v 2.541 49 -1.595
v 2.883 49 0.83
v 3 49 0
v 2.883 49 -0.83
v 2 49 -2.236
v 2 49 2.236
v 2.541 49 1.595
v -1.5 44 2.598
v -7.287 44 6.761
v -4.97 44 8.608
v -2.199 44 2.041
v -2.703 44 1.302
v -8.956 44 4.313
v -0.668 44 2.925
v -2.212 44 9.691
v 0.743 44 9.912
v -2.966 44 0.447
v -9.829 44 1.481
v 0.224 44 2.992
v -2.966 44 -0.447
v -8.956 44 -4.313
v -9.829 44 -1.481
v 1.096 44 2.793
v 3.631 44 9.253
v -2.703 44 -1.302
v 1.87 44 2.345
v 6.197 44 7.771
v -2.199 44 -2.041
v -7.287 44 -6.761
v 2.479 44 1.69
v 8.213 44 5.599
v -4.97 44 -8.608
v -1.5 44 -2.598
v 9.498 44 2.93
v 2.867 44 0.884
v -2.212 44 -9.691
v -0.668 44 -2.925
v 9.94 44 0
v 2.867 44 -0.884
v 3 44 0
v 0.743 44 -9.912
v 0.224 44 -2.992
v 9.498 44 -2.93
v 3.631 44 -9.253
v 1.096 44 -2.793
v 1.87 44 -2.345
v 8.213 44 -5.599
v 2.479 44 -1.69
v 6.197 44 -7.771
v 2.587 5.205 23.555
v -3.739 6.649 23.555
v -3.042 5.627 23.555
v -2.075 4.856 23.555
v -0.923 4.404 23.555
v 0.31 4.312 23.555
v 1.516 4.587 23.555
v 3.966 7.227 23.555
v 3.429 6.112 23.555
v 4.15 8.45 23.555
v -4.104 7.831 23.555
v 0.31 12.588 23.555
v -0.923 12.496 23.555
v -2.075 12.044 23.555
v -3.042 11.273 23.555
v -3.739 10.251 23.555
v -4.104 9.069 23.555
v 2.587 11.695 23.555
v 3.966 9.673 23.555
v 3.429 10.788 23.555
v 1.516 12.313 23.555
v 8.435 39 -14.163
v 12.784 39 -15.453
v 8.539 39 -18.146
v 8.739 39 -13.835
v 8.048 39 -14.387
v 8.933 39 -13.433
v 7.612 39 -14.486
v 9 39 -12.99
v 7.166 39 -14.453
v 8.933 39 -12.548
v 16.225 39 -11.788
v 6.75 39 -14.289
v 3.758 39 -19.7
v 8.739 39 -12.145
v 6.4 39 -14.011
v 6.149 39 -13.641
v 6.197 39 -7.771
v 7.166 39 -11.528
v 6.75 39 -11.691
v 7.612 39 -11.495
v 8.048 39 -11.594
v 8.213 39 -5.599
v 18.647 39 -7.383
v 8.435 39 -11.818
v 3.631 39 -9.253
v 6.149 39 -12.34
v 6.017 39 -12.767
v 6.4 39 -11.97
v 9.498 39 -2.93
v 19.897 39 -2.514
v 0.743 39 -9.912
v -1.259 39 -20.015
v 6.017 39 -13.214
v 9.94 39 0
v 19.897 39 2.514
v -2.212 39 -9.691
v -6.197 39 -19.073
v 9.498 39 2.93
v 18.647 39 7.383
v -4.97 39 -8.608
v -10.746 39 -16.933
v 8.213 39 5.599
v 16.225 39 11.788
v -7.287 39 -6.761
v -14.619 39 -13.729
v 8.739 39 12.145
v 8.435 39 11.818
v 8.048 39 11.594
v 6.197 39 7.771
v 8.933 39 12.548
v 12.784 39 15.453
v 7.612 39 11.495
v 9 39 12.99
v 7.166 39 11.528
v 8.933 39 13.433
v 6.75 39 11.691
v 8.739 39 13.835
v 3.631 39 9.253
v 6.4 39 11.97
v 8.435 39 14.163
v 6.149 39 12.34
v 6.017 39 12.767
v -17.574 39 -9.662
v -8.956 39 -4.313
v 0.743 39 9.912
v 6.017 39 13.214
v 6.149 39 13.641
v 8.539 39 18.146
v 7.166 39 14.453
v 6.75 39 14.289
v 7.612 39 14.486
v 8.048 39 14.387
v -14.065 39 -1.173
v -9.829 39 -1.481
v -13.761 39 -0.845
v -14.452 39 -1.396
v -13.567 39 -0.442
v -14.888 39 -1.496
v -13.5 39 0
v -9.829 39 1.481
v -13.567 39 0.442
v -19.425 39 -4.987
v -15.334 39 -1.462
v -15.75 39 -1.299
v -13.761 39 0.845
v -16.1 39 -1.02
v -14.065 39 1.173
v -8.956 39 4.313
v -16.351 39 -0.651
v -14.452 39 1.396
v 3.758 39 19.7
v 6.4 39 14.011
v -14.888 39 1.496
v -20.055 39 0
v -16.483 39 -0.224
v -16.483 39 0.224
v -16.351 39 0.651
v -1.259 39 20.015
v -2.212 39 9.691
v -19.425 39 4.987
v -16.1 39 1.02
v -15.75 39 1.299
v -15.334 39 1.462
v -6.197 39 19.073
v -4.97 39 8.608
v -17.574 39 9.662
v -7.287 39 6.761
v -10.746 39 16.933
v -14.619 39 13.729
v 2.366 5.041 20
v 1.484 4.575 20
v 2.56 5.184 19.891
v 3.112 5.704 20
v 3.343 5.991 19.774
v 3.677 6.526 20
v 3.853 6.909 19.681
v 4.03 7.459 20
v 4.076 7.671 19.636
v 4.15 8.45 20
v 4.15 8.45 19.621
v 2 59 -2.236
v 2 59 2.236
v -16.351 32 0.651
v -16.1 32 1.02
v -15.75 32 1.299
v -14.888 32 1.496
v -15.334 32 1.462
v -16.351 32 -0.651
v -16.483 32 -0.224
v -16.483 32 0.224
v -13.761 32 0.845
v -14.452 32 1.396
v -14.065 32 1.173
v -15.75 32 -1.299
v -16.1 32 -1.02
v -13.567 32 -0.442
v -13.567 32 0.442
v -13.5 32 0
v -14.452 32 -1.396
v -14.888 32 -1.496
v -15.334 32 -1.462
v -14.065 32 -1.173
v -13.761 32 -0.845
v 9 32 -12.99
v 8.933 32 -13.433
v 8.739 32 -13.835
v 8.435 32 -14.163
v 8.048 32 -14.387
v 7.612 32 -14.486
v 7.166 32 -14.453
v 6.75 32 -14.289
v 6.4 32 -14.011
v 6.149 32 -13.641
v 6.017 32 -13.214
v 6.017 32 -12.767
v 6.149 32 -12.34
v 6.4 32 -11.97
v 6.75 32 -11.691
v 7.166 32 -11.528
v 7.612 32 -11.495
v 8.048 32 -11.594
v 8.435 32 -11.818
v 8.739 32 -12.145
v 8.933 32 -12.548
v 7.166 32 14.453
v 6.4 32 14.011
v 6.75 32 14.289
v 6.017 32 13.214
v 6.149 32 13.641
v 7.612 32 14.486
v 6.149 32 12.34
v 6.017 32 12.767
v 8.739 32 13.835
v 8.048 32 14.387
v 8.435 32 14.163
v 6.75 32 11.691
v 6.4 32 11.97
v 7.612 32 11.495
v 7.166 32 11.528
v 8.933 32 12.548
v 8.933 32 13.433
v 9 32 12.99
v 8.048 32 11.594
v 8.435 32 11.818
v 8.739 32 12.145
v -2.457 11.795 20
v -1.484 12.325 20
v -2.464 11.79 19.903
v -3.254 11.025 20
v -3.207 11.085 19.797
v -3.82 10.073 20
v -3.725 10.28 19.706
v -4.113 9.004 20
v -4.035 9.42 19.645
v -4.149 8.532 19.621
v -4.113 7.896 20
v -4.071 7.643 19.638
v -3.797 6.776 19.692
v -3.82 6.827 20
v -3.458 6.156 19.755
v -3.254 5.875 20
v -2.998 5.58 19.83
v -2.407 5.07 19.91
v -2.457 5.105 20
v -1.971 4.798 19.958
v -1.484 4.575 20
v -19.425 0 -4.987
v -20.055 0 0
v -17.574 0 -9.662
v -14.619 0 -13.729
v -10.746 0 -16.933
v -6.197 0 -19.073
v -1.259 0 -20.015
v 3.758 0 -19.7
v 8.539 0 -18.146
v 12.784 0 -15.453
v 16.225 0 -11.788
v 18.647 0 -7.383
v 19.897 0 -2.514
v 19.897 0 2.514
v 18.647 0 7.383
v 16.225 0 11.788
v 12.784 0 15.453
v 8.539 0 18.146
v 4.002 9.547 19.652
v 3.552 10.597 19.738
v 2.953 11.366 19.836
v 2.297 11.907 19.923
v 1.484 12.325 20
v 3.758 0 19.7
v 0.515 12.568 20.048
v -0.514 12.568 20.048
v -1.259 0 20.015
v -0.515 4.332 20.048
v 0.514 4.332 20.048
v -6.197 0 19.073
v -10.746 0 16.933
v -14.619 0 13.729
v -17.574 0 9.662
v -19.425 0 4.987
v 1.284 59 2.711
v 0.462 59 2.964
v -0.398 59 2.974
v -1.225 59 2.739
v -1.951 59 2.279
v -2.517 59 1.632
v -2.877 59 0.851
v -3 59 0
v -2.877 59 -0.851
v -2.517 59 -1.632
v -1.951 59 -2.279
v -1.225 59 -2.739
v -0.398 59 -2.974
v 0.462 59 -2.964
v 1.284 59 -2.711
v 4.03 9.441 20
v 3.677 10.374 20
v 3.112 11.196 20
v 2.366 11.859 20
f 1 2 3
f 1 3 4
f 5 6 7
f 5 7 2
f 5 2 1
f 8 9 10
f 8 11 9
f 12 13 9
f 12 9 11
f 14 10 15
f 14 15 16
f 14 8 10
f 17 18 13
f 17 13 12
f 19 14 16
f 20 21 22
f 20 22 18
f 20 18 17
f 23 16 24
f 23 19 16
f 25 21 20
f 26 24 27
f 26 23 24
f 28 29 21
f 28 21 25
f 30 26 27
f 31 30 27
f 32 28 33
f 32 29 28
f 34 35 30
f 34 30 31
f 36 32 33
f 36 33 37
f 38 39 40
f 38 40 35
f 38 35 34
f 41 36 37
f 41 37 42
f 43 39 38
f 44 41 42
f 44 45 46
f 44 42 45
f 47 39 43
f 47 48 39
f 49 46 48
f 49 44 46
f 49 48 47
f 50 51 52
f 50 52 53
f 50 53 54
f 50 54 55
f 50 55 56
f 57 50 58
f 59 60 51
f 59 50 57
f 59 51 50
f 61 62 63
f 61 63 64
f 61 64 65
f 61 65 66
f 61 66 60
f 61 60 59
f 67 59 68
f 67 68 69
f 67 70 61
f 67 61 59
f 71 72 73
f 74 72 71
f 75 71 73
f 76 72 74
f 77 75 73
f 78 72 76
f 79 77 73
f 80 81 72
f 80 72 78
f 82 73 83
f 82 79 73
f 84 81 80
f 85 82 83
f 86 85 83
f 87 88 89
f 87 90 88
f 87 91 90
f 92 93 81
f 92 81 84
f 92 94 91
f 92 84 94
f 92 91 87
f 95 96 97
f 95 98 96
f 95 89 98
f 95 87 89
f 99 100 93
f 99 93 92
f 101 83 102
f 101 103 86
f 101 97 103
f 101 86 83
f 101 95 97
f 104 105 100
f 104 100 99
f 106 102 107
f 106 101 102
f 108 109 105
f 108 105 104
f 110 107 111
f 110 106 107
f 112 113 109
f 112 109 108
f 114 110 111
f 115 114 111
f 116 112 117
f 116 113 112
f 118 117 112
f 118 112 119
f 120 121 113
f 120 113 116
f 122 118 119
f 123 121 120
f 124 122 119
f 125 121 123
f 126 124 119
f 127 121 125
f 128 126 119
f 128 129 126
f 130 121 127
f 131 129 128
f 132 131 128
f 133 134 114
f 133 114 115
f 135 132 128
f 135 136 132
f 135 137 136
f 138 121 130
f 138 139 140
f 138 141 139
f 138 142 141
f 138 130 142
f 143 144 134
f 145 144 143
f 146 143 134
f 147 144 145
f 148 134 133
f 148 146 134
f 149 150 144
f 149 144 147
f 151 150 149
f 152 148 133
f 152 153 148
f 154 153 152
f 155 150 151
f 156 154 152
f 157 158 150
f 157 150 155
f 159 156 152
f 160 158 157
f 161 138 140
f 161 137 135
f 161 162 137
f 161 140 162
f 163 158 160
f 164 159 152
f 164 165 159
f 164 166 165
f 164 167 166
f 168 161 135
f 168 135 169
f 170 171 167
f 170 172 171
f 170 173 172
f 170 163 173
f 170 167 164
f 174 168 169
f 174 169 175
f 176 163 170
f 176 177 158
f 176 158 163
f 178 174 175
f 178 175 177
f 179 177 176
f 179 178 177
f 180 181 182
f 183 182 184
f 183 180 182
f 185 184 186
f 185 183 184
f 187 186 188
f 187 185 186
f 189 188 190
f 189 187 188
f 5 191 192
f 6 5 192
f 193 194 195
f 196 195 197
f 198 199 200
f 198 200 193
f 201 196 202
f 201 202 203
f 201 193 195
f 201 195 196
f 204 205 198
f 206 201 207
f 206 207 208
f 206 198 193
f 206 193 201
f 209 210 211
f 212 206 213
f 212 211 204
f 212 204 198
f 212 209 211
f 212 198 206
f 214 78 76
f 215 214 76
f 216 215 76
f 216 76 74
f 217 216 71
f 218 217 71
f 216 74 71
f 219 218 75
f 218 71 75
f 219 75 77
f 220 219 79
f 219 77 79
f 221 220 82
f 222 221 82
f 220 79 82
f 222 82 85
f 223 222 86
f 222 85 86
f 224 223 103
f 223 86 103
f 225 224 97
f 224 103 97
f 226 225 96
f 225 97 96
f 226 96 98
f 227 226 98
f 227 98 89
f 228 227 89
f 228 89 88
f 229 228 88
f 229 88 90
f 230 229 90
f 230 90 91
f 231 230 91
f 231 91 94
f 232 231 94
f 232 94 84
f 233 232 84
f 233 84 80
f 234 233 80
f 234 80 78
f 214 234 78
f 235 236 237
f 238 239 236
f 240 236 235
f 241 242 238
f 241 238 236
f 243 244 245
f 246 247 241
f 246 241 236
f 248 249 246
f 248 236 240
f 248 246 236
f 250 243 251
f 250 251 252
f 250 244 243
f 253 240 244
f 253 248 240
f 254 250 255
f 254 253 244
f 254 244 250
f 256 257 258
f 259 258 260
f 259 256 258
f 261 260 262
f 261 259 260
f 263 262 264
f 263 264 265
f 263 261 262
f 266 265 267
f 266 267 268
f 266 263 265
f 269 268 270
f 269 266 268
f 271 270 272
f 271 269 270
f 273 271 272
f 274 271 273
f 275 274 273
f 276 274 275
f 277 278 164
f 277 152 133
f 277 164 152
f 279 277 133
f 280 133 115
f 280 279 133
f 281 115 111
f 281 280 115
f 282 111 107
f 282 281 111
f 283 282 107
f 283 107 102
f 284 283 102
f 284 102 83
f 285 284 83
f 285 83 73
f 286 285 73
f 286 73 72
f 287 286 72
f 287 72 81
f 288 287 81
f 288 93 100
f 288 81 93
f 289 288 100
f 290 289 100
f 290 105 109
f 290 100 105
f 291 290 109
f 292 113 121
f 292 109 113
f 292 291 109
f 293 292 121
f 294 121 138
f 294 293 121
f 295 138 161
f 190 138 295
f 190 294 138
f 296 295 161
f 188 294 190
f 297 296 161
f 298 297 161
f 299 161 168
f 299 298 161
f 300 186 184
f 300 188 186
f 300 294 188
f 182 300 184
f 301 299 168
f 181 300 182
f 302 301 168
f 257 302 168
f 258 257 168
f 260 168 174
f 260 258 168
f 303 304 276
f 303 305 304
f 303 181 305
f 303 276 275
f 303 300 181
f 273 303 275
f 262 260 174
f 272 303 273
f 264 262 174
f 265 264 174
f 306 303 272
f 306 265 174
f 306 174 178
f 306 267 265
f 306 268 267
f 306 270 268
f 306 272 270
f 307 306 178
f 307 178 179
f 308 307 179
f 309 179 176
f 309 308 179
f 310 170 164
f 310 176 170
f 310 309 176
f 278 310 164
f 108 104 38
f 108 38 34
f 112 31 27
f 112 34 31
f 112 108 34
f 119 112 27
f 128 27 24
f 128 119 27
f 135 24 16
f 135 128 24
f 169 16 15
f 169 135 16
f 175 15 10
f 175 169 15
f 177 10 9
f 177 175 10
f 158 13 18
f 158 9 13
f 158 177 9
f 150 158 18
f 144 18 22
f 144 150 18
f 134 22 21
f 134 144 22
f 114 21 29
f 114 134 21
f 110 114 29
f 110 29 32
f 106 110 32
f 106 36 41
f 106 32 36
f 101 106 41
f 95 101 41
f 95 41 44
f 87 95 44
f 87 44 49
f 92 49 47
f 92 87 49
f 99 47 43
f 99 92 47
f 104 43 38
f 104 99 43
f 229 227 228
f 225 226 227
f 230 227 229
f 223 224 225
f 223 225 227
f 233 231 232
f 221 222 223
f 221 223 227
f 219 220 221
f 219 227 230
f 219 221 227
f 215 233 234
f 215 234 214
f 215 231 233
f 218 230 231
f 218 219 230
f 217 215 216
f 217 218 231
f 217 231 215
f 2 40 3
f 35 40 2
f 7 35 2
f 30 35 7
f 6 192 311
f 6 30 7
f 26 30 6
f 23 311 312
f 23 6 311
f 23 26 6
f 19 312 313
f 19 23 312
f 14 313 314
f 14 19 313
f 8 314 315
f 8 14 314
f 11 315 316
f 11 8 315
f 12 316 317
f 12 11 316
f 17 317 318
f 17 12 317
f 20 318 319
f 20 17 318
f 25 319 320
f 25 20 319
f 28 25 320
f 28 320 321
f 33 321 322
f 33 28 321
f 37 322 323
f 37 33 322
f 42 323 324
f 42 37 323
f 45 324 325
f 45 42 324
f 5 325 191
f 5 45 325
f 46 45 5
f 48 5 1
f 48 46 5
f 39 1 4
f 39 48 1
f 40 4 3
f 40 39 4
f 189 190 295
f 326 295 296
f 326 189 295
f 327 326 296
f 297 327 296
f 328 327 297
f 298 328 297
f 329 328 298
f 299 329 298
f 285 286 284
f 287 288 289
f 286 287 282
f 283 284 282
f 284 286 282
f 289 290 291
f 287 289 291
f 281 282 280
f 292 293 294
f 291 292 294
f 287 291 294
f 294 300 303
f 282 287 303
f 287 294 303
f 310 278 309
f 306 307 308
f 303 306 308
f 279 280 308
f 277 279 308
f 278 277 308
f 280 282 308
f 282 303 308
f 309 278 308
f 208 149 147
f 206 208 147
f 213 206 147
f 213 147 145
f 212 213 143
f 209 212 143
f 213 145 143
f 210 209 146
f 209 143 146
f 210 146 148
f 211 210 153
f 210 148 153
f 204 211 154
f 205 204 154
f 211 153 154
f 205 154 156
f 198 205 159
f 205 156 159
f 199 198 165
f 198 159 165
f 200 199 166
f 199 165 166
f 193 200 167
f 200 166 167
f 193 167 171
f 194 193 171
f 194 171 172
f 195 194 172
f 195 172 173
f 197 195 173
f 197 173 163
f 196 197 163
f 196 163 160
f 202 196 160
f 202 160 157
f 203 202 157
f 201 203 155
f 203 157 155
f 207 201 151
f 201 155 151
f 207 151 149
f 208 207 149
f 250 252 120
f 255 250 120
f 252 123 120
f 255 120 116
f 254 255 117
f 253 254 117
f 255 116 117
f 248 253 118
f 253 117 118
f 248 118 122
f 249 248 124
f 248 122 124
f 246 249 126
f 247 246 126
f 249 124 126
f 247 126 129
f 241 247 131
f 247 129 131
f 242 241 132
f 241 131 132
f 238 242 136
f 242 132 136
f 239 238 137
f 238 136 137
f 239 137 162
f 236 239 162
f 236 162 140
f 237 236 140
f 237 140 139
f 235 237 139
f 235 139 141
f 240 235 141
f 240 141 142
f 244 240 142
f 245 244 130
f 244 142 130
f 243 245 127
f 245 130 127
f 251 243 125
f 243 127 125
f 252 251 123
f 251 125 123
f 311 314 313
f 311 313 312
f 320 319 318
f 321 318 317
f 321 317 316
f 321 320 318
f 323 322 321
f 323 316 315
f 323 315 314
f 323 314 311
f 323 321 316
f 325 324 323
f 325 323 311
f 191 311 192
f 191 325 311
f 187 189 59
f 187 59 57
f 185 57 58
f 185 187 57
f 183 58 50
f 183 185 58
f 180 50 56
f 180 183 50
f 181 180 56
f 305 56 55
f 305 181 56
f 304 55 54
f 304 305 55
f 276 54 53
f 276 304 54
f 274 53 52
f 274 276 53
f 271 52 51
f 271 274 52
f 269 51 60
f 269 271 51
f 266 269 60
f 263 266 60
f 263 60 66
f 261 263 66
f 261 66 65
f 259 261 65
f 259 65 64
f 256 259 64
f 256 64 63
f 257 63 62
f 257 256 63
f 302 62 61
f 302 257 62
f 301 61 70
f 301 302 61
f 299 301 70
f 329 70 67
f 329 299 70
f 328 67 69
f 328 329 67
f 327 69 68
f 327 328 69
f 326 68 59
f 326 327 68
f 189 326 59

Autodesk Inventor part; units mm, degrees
ref_plane "YZ Plane" through (0, 0, 0) normal (1, 0, 0) x (0, 1, 0)
ref_plane "XZ Plane" through (0, 0, 0) normal (0, 1, 0) x (-1, 0, 0)
sketch "草圖1" plane through (0, 0, 0) normal (0, 1, 0) x (-1, 0, 0)
  circle A0 centre (0, 0) radius 20.055
  dimension "d0" = 40.11
extrude "擠出1" add sketch "草圖1" along normal blind 39
sketch "草圖2" plane through (0, 39, 0) normal (0, 1, 0) x (1, 0, 0)
  circle A0 centre (0, 0) radius 9.94
  dimension "d3" = 19.88
extrude "擠出2" add sketch "草圖2" along normal blind 5
sketch "草圖3" plane through (0, 44, 0) normal (0, 1, 0) x (1, 0, 0)
  circle A0 centre (0, 0) radius 3
  dimension "d6" = 6
extrude "擠出3" add sketch "草圖3" along normal blind 15
sketch "草圖4" plane through (0, 59, 0) normal (0, 1, 0) x (1, 0, 0)
  circle A0 centre (0, 0) radius 3 projected
  line L0 (-16.4783, -20) -> (15.8218, -20) construction
  line L1 (2, 2.2361) -> (2, -2.2361)
  arc A1 (2, -2.2361) -> (2, 2.2361) centre (0, 0) ccw
  point P0 (-3, 0)
  dimension "d9" = 20
  dimension "d10" = 20
  dimension "d11" = 5
extrude "擠出4" cut sketch "草圖4" against normal blind 10 contours A0 L1 picked at (2.1409, -0.5898)
ref_plane "工作平面2" through (0, 0, 20) normal (0, 0, 1) x (1, 0, 0)
sketch "草圖5" plane through (0, 0, 20) normal (0, 0, 1) x (1, 0, 0)
  circle A0 centre (0, 8.45) radius 4.15
  point P0 (0, 0)
  dimension "d16" = 8.3
  dimension "d17" = 8.45
extrude "擠出5" add sketch "草圖5" along normal mid plane 7.11
sketch "草圖6" plane through (0, 39, 0) normal (0, 1, 0) x (1, 0, 0)
  circle A0 centre (-15, 0) radius 1.5
  circle A1 centre (7.5, -12.9904) radius 1.5
  circle A2 centre (7.5, 12.9904) radius 1.5
  line L0 (0, 0) -> (7.5, -12.9904) construction
  arc A3 (2, 2.2361) -> (2, -2.2361) centre (0, 0) ccw projected
  line L1 (0, 0) -> (7.5, 12.9904) construction
  line L2 (0, 0) -> (-20.055, 0) construction
  circle A4 centre (0, 0) radius 20.055 projected
  dimension "d20" = 120
  dimension "d21" = 120
  dimension "d22" = 3
  dimension "d23" = 15
  dimension "d24" = 15
  dimension "d25" = 15
extrude "擠出6" cut sketch "草圖6" against normal blind 7 contours A0 | A1 | A2
properties part number "E6B2-CWZ6C"
